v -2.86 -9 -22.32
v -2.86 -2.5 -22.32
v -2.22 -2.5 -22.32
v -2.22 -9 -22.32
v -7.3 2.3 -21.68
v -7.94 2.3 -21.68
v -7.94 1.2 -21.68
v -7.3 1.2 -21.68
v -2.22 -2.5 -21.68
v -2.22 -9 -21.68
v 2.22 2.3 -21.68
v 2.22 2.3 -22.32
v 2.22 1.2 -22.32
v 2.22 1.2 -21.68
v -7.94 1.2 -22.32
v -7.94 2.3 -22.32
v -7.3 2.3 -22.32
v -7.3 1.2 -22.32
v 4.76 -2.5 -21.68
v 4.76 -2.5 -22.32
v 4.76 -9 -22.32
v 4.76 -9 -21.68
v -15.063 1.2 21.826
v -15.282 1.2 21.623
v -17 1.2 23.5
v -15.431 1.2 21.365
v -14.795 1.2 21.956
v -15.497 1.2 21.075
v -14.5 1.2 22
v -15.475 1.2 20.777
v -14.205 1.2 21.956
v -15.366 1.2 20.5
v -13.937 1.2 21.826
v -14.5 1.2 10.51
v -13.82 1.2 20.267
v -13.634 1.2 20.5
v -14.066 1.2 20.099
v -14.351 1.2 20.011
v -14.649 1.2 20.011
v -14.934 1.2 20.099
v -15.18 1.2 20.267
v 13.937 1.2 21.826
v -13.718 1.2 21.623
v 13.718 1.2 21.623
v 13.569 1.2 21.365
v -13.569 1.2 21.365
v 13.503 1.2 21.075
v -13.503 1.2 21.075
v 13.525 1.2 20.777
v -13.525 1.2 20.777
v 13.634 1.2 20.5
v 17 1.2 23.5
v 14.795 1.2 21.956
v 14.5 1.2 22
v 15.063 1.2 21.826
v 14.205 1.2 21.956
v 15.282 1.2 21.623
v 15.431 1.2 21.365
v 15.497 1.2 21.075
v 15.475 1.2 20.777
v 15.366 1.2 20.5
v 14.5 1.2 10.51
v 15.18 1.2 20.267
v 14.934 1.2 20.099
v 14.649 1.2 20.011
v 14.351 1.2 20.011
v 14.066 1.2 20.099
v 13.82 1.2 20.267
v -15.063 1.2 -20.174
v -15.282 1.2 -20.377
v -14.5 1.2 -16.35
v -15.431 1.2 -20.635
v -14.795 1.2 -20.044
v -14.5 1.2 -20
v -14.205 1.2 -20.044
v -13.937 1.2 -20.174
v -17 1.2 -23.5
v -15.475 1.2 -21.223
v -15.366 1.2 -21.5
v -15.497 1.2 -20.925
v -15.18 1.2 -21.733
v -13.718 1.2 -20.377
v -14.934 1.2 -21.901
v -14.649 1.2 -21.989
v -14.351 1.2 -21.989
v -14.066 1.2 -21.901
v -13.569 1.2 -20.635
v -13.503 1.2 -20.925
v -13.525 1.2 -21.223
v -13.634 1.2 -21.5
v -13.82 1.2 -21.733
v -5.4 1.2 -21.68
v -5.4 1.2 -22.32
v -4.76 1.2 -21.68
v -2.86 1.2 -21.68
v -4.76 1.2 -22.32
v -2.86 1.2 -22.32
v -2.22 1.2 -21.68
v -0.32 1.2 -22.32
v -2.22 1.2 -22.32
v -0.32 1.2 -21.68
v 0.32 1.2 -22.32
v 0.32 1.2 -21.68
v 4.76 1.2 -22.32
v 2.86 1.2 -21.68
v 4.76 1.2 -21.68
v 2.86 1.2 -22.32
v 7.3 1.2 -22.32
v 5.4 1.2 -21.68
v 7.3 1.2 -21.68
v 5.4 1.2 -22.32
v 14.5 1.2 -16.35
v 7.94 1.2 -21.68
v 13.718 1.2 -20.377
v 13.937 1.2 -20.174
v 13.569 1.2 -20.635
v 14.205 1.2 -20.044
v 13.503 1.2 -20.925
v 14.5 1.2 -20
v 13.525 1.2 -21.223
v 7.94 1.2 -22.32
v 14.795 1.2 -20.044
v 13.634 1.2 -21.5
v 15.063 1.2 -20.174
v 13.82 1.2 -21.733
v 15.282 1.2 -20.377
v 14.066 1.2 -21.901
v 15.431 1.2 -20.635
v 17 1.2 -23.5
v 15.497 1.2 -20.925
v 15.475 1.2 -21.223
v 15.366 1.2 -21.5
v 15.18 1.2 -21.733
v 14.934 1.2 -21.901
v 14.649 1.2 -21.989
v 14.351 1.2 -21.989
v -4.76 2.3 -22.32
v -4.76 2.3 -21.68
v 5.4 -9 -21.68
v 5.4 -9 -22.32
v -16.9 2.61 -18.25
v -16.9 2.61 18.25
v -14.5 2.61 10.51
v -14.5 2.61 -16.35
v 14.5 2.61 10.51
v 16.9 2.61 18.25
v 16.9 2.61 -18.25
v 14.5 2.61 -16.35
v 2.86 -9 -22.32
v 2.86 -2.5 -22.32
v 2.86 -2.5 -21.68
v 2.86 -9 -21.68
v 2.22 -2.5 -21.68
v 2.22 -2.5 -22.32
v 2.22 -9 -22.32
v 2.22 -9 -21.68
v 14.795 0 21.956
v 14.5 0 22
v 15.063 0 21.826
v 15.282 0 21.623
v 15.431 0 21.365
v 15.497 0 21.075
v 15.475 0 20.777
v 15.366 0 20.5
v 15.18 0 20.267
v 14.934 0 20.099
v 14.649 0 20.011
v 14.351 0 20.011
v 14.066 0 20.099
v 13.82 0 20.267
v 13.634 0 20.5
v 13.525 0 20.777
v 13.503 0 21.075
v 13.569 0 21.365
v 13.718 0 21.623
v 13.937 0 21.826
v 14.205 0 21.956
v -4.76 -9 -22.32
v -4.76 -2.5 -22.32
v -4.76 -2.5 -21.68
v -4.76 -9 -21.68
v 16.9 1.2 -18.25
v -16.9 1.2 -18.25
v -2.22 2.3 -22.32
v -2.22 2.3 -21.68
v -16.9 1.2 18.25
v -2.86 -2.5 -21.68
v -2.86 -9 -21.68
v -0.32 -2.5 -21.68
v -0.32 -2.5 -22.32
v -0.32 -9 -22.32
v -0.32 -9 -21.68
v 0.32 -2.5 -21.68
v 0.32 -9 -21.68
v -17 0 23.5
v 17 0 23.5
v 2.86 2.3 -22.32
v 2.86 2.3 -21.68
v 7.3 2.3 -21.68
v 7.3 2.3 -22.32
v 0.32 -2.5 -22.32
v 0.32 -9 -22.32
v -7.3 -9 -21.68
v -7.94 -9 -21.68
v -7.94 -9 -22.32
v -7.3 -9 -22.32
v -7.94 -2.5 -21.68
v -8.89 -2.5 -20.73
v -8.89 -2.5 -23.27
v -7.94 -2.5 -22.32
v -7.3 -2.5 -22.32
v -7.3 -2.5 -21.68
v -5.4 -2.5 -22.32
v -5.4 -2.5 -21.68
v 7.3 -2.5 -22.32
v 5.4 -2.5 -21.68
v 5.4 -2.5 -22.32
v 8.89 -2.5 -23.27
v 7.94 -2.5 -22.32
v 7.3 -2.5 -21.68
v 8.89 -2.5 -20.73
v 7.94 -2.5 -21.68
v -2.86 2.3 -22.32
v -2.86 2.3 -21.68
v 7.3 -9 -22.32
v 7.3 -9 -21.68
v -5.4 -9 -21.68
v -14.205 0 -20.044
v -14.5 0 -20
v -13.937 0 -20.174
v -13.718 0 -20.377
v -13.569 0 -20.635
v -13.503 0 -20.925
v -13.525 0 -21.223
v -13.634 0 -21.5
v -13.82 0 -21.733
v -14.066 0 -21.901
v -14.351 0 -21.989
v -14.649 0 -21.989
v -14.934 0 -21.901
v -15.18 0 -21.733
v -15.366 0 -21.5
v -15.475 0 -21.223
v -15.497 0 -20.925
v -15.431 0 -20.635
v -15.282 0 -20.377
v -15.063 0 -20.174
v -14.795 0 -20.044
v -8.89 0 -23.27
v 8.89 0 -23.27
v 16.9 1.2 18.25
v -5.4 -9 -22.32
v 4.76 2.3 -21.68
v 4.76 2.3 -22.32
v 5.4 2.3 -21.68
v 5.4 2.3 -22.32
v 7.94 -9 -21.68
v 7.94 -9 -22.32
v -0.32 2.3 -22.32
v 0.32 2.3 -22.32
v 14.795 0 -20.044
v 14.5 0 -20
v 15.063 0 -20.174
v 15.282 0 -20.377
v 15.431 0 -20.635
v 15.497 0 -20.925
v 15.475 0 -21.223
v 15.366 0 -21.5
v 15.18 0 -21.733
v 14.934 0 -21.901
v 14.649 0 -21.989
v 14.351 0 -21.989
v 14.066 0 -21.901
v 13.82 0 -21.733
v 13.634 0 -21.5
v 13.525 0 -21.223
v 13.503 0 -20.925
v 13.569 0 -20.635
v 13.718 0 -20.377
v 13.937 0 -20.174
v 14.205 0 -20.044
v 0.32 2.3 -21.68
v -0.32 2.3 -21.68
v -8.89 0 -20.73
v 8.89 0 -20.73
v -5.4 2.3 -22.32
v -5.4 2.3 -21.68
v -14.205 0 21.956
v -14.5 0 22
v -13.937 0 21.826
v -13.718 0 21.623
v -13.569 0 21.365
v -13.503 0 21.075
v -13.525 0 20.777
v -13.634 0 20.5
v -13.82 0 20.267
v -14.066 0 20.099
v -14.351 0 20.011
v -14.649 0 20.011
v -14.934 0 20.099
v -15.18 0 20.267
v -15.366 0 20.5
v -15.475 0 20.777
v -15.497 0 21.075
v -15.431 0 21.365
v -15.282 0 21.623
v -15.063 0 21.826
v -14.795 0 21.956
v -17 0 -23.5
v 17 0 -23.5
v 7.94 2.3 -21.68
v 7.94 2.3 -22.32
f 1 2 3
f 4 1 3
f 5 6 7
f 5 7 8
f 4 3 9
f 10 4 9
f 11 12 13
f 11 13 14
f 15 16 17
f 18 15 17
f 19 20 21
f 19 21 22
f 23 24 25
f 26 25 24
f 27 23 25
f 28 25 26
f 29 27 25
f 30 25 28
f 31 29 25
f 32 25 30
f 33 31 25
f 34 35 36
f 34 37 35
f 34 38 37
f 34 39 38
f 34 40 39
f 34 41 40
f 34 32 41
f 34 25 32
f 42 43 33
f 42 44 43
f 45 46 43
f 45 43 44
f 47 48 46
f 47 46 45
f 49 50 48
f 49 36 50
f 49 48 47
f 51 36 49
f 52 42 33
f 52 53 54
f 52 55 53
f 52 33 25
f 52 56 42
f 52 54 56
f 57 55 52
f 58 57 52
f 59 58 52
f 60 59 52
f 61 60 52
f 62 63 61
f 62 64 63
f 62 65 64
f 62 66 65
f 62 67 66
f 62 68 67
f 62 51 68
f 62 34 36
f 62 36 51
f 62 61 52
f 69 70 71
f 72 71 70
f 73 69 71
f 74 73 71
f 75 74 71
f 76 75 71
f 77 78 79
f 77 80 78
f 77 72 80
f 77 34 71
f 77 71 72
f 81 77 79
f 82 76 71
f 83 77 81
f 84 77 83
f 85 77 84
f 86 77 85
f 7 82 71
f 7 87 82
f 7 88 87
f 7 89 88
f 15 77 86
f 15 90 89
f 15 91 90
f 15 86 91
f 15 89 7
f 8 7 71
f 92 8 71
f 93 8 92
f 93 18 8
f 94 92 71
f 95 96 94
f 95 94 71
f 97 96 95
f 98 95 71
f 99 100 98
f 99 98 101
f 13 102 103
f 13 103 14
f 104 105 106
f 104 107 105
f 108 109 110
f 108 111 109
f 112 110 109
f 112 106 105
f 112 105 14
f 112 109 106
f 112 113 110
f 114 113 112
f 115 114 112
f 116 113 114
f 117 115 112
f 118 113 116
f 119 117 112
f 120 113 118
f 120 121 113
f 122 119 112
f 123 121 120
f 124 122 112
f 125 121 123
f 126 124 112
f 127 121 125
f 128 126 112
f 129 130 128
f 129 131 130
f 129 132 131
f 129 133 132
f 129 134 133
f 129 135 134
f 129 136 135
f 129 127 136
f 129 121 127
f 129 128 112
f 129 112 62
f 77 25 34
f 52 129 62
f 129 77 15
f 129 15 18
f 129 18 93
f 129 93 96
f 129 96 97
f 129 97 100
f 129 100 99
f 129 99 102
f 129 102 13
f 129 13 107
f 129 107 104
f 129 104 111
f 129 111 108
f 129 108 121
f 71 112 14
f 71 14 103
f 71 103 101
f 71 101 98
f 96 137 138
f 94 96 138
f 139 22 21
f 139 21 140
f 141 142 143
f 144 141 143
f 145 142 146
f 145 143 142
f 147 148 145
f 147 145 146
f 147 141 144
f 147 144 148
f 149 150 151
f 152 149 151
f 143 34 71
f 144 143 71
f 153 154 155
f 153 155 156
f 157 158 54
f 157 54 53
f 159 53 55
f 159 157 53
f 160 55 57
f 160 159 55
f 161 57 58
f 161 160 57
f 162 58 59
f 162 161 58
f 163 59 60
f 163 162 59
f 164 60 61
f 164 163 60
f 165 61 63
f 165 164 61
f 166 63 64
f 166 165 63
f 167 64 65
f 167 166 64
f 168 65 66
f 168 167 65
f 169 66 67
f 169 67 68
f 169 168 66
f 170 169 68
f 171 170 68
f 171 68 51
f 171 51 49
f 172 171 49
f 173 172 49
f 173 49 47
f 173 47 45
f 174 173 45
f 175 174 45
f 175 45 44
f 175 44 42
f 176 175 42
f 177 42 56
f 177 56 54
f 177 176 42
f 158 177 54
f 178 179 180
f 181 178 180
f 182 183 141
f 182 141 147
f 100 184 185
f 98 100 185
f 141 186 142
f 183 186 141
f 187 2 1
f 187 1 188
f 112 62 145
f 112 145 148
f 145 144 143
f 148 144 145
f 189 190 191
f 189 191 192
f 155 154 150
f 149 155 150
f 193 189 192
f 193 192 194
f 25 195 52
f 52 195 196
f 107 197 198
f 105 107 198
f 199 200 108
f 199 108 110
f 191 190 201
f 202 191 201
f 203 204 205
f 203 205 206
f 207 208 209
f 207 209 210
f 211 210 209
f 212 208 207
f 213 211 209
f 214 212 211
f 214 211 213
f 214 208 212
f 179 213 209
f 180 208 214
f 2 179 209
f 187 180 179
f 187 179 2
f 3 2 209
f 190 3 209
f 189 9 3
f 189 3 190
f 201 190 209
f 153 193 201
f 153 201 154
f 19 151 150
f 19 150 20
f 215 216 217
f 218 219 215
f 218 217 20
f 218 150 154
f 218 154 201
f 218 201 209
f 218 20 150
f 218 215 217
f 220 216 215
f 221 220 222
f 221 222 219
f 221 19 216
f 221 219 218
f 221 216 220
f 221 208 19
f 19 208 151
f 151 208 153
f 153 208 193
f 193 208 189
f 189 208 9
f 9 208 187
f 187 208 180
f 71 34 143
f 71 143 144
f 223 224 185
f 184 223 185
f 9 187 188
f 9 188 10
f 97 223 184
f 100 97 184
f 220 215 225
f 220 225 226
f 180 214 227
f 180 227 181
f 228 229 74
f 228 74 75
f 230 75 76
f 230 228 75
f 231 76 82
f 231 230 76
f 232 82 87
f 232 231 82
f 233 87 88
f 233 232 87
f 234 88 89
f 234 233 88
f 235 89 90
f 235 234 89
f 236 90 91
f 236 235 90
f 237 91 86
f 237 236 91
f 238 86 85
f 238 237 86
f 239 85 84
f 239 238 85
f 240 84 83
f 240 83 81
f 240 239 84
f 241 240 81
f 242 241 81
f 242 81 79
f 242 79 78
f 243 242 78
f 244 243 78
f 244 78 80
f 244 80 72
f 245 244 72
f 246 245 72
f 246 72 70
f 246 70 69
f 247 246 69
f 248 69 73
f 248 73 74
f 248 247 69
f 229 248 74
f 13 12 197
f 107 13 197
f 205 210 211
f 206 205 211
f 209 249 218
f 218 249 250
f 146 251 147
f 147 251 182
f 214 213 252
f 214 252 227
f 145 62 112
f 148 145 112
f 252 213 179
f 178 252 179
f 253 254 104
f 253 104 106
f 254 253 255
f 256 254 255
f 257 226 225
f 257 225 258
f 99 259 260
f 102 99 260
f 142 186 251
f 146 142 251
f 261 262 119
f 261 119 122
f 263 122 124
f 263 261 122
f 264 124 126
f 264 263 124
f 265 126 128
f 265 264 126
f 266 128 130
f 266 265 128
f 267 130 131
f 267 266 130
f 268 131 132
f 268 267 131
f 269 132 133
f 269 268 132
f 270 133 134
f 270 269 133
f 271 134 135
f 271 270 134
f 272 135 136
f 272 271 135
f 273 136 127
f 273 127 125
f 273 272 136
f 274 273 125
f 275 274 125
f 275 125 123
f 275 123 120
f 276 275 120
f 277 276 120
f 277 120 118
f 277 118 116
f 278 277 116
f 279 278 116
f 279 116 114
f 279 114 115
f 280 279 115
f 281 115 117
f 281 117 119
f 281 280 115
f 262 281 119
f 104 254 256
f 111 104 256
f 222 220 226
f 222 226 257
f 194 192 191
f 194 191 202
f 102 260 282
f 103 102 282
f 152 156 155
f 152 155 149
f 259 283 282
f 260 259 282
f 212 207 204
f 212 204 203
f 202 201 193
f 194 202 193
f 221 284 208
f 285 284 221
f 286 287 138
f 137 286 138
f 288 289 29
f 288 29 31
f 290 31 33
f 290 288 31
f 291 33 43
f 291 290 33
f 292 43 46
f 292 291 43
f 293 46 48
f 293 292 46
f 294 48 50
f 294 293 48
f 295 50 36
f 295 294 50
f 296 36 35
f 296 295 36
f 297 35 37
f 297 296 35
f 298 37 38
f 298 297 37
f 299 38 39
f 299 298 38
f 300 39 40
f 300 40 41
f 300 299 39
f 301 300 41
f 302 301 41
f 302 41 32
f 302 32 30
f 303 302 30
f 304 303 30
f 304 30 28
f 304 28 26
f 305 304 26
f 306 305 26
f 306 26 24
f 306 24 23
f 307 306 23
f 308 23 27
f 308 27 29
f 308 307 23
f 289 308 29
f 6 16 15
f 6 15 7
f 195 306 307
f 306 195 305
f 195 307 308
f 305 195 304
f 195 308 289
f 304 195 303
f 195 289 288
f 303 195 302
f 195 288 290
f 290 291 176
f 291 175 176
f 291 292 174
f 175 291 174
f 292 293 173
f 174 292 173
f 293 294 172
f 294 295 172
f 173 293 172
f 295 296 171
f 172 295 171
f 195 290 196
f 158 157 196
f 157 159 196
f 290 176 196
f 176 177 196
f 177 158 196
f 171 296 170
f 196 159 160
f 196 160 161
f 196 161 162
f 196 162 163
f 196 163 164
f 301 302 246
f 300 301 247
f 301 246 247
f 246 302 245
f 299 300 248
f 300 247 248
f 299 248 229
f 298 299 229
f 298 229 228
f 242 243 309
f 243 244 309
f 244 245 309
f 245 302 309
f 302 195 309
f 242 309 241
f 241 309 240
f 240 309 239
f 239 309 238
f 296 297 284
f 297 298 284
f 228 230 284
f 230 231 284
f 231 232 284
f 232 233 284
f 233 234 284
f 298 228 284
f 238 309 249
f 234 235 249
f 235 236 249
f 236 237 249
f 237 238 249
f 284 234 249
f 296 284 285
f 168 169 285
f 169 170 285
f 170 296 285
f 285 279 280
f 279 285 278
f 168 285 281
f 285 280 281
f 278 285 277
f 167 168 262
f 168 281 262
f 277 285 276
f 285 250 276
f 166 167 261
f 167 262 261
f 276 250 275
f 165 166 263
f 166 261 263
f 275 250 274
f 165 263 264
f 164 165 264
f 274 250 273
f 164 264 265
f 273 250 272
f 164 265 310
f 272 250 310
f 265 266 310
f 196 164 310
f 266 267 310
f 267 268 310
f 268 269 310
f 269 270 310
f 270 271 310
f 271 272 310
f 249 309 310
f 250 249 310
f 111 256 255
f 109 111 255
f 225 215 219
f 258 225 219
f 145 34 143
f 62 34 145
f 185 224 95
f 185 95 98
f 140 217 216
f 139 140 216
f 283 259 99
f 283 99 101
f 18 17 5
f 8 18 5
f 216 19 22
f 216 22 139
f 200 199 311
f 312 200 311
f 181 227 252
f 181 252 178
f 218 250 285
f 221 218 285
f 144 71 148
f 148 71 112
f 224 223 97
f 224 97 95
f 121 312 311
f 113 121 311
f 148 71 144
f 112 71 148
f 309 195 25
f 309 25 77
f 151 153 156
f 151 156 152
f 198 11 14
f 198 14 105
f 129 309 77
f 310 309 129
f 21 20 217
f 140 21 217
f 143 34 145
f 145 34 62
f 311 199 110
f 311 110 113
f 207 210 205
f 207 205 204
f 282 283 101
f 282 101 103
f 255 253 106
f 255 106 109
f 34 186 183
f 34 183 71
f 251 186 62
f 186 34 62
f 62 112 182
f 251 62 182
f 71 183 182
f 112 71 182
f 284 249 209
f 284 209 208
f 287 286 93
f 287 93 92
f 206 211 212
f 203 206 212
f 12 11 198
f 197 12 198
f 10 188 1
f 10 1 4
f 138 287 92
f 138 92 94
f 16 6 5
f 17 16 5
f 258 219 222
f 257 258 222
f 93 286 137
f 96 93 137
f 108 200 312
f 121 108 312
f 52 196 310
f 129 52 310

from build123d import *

# Parameters (mm, degrees)
PCB_2_W                   = 34
PCB_2_H                   = 47
PCB_2_R                   = 1
PCB_DEPTH                 = 1.2
OLED_2_W                  = 29
OLED_2_H                  = 26.86
OLED_DEPTH                = 1.41
OLED_3_2_W                = 29
OLED_3_2_H                = 26.86
OLED_3_DEPTH              = 1.41
SKETCH_2_54_W             = 17.78
SKETCH_2_54_H             = 2.54
SKETCH_2_54_W_2           = 0.64
SKETCH_2_54_H_2           = 0.64
EXTRUDE_2_54_0_DEPTH      = 2.5
EXTRUDE_2_54_1_DEPTH      = 9
EXTRUDE_2_54_1_DEPTH_BACK = 2.3
SKETCH_2_54_3_W           = 0.64
SKETCH_2_54_3_H           = 0.64


with BuildPart() as part:
    # PCB 2 → PCB (new body)
    with BuildSketch(Plane(origin=(0, 0, 0), x_dir=(1, 0, 0), z_dir=(0, 1, 0))):
        Rectangle(PCB_2_W, PCB_2_H)
        with Locations((-14.5, 21)):
            Circle(PCB_2_R, mode=Mode.SUBTRACT)
        with Locations((14.5, 21)):
            Circle(PCB_2_R, mode=Mode.SUBTRACT)
        with Locations((-14.5, -21)):
            Circle(PCB_2_R, mode=Mode.SUBTRACT)
        with Locations((14.5, -21)):
            Circle(PCB_2_R, mode=Mode.SUBTRACT)
    extrude(amount=PCB_DEPTH)

    # OLED 2 → OLED (add)
    with BuildSketch(Plane(origin=(0, 1.2, 0), x_dir=(1, 0, 0), z_dir=(0, 1, 0))):
        with Locations((0, 2.92)):
            Rectangle(OLED_2_W, OLED_2_H)
    extrude(amount=OLED_DEPTH)

    # 2.54针脚草图 → 2.54针脚0 (add)
    with BuildSketch(Plane.XZ):
        with Locations((0, -22)):
            Rectangle(SKETCH_2_54_W, SKETCH_2_54_H)
        with Locations((7.62, -22)):
            Rectangle(SKETCH_2_54_W_2, SKETCH_2_54_H_2, mode=Mode.SUBTRACT)
        with Locations((5.08, -22)):
            Rectangle(SKETCH_2_54_W_2, SKETCH_2_54_H_2, mode=Mode.SUBTRACT)
        with Locations((2.54, -22)):
            Rectangle(SKETCH_2_54_W_2, SKETCH_2_54_H_2, mode=Mode.SUBTRACT)
        with Locations((0, -22)):
            Rectangle(SKETCH_2_54_W_2, SKETCH_2_54_H_2, mode=Mode.SUBTRACT)
        with Locations((-2.54, -22)):
            Rectangle(SKETCH_2_54_W_2, SKETCH_2_54_H_2, mode=Mode.SUBTRACT)
        with Locations((-5.08, -22)):
            Rectangle(SKETCH_2_54_W_2, SKETCH_2_54_H_2, mode=Mode.SUBTRACT)
        with Locations((-7.62, -22)):
            Rectangle(SKETCH_2_54_W_2, SKETCH_2_54_H_2, mode=Mode.SUBTRACT)
    extrude(amount=EXTRUDE_2_54_0_DEPTH)

    # 2.54针脚草图<3> → 2.54针脚1 (add, two sides: drawn at the far end of the back side and taken through both)
    with BuildSketch(Plane.XZ.offset(-EXTRUDE_2_54_1_DEPTH_BACK)):
        with Locations((7.62, -22)):
            Rectangle(SKETCH_2_54_3_W, SKETCH_2_54_3_H)
        with Locations((5.08, -22)):
            Rectangle(SKETCH_2_54_3_W, SKETCH_2_54_3_H)
        with Locations((2.54, -22)):
            Rectangle(SKETCH_2_54_3_W, SKETCH_2_54_3_H)
        with Locations((0, -22)):
            Rectangle(SKETCH_2_54_3_W, SKETCH_2_54_3_H)
        with Locations((-2.54, -22)):
            Rectangle(SKETCH_2_54_3_W, SKETCH_2_54_3_H)
        with Locations((-5.08, -22)):
            Rectangle(SKETCH_2_54_3_W, SKETCH_2_54_3_H)
        with Locations((-7.62, -22)):
            Rectangle(SKETCH_2_54_3_W, SKETCH_2_54_3_H)
    extrude(amount=EXTRUDE_2_54_1_DEPTH + EXTRUDE_2_54_1_DEPTH_BACK)


with BuildPart() as body_2:
    # OLED_3 2 → OLED 3 (new body)
    with BuildSketch(Plane(origin=(0, 1.2, 0), x_dir=(1, 0, 0), z_dir=(0, 1, 0))):
        Polygon((16.9, 18.25), (-16.9, 18.25), (-16.9, 0), (-16.9, -18.25), (16.9, -18.25), align=None)
        with Locations((0, 2.92)):
            Rectangle(OLED_3_2_W, OLED_3_2_H, mode=Mode.SUBTRACT)
    extrude(amount=OLED_3_DEPTH)


solid = Compound([part.part, body_2.part])
